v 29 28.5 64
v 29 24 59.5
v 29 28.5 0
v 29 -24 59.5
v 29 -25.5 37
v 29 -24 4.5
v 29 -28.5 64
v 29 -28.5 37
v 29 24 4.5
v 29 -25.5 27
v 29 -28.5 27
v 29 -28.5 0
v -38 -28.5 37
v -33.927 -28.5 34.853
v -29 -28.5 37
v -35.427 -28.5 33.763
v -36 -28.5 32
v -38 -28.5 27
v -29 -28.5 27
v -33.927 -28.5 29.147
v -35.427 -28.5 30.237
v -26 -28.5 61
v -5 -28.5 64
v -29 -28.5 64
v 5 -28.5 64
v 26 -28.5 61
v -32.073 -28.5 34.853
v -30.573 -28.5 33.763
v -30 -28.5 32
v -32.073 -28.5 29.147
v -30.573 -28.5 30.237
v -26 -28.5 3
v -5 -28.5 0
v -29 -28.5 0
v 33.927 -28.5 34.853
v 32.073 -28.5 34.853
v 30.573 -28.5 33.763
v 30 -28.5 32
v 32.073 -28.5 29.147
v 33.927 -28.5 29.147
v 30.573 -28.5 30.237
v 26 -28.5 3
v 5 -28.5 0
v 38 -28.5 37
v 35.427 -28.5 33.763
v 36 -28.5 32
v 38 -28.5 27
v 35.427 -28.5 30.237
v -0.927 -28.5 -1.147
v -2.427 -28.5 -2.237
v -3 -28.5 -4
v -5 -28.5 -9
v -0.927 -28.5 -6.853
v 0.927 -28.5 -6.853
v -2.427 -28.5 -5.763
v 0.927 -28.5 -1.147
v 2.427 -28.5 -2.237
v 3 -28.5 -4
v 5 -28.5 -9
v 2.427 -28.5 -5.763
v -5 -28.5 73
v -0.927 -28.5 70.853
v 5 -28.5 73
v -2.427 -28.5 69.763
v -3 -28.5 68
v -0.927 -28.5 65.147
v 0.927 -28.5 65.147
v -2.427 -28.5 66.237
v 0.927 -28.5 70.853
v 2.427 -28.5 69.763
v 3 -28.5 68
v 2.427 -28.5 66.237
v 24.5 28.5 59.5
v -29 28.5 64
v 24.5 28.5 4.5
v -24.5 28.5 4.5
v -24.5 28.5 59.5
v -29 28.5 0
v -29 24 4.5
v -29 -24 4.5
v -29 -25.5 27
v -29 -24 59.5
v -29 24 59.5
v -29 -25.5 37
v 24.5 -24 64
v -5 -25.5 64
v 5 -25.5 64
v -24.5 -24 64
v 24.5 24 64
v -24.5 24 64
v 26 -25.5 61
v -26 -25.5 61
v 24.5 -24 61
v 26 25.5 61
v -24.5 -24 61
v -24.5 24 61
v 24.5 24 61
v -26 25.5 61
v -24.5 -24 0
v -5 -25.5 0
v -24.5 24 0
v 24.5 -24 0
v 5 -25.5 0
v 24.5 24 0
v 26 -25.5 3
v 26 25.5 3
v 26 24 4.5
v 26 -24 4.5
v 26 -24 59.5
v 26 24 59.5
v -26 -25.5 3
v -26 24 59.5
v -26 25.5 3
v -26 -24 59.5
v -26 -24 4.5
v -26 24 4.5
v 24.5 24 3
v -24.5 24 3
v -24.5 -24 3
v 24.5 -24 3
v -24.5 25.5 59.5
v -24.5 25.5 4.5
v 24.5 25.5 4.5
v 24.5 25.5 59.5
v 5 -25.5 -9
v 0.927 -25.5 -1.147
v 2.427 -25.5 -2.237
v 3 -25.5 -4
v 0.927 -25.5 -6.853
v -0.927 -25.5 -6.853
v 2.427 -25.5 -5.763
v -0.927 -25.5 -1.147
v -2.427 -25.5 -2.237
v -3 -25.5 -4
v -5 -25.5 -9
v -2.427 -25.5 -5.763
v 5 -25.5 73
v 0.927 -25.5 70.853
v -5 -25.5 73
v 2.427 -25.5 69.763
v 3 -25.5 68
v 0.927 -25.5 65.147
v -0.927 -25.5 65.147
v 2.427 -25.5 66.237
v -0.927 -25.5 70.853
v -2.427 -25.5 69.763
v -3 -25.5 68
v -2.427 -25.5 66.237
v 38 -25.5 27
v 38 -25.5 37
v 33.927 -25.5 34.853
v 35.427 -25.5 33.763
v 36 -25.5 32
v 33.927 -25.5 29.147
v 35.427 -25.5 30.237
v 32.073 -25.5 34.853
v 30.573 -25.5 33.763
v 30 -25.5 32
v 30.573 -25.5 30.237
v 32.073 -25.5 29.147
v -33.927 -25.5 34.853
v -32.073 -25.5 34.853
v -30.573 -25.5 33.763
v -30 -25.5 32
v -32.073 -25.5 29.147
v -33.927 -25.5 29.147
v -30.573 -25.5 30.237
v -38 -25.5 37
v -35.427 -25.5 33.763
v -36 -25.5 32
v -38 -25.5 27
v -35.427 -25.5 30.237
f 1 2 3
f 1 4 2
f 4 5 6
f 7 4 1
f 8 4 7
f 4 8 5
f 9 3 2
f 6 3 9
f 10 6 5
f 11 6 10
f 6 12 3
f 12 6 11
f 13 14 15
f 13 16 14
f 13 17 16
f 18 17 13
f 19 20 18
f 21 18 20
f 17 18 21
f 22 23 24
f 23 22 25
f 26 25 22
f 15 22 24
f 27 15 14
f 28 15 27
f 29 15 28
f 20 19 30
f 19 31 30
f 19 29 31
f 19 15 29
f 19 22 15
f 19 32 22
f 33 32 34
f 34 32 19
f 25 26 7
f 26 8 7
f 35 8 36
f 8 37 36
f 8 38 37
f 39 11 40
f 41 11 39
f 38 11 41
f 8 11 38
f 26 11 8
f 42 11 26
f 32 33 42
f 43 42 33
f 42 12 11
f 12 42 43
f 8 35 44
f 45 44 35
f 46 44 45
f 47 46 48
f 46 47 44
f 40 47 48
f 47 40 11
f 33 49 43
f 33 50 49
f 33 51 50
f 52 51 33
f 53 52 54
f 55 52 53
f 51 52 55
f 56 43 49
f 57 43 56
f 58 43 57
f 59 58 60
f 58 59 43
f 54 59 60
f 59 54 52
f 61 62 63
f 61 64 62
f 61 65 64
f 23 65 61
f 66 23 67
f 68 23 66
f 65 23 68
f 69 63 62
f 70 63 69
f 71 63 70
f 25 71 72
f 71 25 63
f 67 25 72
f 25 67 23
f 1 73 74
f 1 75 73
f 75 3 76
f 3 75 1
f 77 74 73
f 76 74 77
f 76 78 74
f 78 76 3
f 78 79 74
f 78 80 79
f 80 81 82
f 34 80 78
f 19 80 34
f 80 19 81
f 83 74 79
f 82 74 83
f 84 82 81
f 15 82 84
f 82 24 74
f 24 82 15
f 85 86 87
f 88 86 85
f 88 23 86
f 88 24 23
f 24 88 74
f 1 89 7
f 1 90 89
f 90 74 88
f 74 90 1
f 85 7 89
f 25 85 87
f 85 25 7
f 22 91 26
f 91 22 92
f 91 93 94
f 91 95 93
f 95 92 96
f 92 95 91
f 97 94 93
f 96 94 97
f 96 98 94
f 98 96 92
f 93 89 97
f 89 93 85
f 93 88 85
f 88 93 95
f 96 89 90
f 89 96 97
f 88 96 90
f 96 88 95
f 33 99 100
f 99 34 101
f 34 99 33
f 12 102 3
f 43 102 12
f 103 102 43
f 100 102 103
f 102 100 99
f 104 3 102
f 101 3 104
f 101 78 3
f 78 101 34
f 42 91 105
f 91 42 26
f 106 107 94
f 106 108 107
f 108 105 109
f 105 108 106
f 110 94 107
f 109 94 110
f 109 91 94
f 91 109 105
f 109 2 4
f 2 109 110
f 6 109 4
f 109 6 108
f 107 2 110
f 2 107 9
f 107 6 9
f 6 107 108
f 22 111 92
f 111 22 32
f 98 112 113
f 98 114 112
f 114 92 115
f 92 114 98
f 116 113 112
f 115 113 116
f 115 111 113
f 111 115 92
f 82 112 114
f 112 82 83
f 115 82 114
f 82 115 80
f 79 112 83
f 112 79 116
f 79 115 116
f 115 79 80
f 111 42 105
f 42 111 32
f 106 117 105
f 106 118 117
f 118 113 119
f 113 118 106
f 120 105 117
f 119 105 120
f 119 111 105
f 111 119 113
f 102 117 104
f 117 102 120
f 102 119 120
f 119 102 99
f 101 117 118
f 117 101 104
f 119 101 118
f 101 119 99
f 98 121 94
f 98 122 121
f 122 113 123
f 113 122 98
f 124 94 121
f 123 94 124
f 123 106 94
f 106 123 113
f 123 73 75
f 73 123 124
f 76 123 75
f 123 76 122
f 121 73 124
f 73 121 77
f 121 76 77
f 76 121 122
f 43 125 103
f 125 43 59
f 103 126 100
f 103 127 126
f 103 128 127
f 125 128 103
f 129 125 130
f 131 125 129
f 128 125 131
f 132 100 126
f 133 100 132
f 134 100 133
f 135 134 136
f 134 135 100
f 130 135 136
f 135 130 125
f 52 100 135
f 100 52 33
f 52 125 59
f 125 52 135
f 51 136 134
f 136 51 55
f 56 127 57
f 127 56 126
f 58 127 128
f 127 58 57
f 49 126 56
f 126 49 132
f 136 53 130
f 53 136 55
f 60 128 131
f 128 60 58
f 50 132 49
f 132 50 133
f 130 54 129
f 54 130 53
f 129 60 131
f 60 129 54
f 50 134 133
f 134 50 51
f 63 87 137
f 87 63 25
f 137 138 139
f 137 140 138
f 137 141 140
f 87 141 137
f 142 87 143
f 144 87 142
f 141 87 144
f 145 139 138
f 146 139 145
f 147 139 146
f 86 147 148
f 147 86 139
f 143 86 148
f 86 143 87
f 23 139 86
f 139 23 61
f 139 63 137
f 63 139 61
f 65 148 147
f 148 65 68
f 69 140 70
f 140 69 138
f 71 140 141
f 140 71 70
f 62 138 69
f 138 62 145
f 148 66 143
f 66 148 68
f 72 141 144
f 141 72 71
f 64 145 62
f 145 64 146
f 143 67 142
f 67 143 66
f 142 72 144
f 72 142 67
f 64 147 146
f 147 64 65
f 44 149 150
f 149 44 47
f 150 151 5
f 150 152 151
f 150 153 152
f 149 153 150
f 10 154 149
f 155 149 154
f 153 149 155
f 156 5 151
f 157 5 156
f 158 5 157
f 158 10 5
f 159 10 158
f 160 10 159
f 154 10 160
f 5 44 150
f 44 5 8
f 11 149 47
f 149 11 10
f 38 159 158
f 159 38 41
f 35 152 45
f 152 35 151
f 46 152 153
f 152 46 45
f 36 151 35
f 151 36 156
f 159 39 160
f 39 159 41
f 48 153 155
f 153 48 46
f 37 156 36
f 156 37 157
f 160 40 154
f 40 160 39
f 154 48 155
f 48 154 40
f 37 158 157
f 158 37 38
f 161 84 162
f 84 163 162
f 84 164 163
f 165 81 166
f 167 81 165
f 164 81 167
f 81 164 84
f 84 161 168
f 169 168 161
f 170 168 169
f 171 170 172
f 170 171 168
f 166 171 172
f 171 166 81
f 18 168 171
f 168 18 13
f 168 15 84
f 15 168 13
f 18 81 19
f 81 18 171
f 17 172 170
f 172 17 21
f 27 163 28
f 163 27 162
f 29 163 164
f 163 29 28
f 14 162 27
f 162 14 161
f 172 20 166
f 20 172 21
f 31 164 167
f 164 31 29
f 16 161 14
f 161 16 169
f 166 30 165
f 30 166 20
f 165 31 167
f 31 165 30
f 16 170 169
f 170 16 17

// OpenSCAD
cameraWidth=52;
cameraHeightWithBase=58;
cameraDepth=51;
thickness=3;


module wyzeCamV3Dummy() {
  color("white")
    cube([cameraWidth, cameraHeightWithBase, cameraDepth], center = true);
}

function xFromOrientation(orientation, dimensions)
  = orientation == "up" || orientation == "bottom"
  ? dimensions.x
  : orientation == "left" || orientation == "right"
  ? dimensions.y
  : orientation == "back" || orientation == "front"
  ? dimensions.x
  : 0
  ;

function zFromOrientation(orientation, dimensions)
  = orientation == "up" || orientation == "bottom"
  || orientation == "left" || orientation == "right"
  ? dimensions.z
  : orientation == "back" || orientation == "front"
  ? dimensions.y
  : 0
  ;

function rotationAngleFromOrientation(orientation)
  = orientation == "up" || orientation == "bottom"
  ? 0
  : 90
  ;

function rotationVectorFromOrientation(orientation)
  = orientation == "up" ||
    orientation == "bottom"
  ? [0, 0, 0]
  : orientation == "left" || orientation == "right"
  ? [0, 0, 1]
  : orientation == "back" || orientation == "front"
  ? [1, 0, 0]
  : [0, 0, 0]
  ;

function rotationOffset(dimensions, orientation, thickness)
  = orientation == "left"
  ? [dimensions.x / 2 + thickness / 2, dimensions.y / 2 + thickness, 0]
  : orientation == "right"
  ? [-dimensions.x / 2 - thickness / 2, dimensions.y / 2 + thickness, 0]
  : orientation == "front"
  ? [0, dimensions.y / 2 + thickness, dimensions.z / 2 + thickness / 2]
  : orientation == "back"
  ? [0, dimensions.y / 2 + thickness, -dimensions.z / 2 - thickness / 2]
  : orientation == "up"
  ? [0, dimensions.y + thickness * 1.5, 0]
  : orientation == "bottom"
  ? [0, thickness / 2, 0]
  : [0, 0, 0]
  ;

/**
 * Creates the side of a bracket frame. Dimensions indicates its size, the
 * orientation indicates which side of the frame to create, and the thickness is
 * the thickness of the frame itself.
 */
module bracketFrameSide(dimensions, orientation, thickness=3) {
  // Bleh, just use strings as enums. No fancy normalization vector for us. I
  // don't know how to pull that off.
  let(
    x = xFromOrientation(orientation, dimensions),
    z = zFromOrientation(orientation, dimensions),
    angle = rotationAngleFromOrientation(orientation),
    rotationVector = rotationVectorFromOrientation(orientation)
  ) {
    // Offset the side to where it needs to be, post rotation.
    translate(rotationOffset(dimensions, orientation, thickness)) {
      rotate(angle, rotationVector) {
        difference() {
          cube([
            x + thickness * 2,
            thickness,
            z + thickness * 2,
          ], center = true);
          // Subtract a smaller cube to achieve a picture-frame like entity.
          cube([
            x - thickness,
            thickness + 2,
            z - thickness,
          ], center = true);
        }
      }
    }
  }
}

mountDimensions = [10, 10, 3];
module mount() {
  difference() {
    cube(mountDimensions, center = true);
    cylinder(r=3, h = mountDimensions.z * 1.5, center = true);
  }
}

/**
 * Creates a bracket to mount a Wyze Camera against a peep hole. Has countersink
 * holes, and should be adequate for any orientation.
 *
 * It's useful to protect the camera itself with something like a small piece of
 * plexiglass, whose thickness is included in the coverDepth parameter.
 */
module wyzeCameraPeepHoleBracket(thickness=3, coverDepth=0) {
  // TODO: Do a lookup for different cameras (WyzeCam v3, v2, etc).
  cameraDimensions = [
    cameraWidth,
    cameraHeightWithBase,
    cameraDepth,
  ];
  // The side edges are beveled to almost a 1/4in size, but I don't have the
  // tools needed to measure that precisely. However, we can create a bracket
  // that doesn't care about that.
  color("green") {
    bracketFrameSide(cameraDimensions, "up", thickness);
    bracketFrameSide(cameraDimensions, "left", thickness);
    bracketFrameSide(cameraDimensions, "right", thickness);
    bracketFrameSide(cameraDimensions, "bottom", thickness);
    bracketFrameSide(cameraDimensions, "back", thickness);
    // Don't do the front side, because that's where we will insert the camra.
  }
  color("teal") {
    translate([
      0,
      -mountDimensions.y / 2 + 1,
      cameraDimensions.z / 2 + mountDimensions.z / 2,
    ]) rotate(90, [0, 0, 0]) mount();
    translate([
      0,
      cameraDimensions.y + mountDimensions.y / 2 + thickness * 2 - 1,
      cameraDimensions.z / 2 + mountDimensions.z / 2,
    ]) rotate(90, [0, 0, 0]) mount();
    translate([
      cameraDimensions.x / 2 + mountDimensions.y / 2 + thickness - 1,
      (cameraDimensions.y / 2) + thickness,
      cameraDimensions.z / 2 + mountDimensions.z / 2,
    ]) rotate(90, [0, 0, 0]) mount();
    translate([
      -(cameraDimensions.x / 2 + mountDimensions.y / 2 + thickness - 1),
      (cameraDimensions.y / 2) + thickness,
      cameraDimensions.z / 2 + mountDimensions.z / 2,
    ]) rotate(90, [0, 0, 0]) mount();
  }
}

// In OpenSCAD, z is up, and y is depth. This inverts my understanding of how
// three dimensions are typically represented. However, one can add a final
// rotation to everything to "fix" it.
rotate(90, [1, 0, 0]) {
  difference() {
    wyzeCameraPeepHoleBracket();
    translate([0, cameraHeightWithBase / 2 + thickness, 0]) #wyzeCamV3Dummy();
  }
}
